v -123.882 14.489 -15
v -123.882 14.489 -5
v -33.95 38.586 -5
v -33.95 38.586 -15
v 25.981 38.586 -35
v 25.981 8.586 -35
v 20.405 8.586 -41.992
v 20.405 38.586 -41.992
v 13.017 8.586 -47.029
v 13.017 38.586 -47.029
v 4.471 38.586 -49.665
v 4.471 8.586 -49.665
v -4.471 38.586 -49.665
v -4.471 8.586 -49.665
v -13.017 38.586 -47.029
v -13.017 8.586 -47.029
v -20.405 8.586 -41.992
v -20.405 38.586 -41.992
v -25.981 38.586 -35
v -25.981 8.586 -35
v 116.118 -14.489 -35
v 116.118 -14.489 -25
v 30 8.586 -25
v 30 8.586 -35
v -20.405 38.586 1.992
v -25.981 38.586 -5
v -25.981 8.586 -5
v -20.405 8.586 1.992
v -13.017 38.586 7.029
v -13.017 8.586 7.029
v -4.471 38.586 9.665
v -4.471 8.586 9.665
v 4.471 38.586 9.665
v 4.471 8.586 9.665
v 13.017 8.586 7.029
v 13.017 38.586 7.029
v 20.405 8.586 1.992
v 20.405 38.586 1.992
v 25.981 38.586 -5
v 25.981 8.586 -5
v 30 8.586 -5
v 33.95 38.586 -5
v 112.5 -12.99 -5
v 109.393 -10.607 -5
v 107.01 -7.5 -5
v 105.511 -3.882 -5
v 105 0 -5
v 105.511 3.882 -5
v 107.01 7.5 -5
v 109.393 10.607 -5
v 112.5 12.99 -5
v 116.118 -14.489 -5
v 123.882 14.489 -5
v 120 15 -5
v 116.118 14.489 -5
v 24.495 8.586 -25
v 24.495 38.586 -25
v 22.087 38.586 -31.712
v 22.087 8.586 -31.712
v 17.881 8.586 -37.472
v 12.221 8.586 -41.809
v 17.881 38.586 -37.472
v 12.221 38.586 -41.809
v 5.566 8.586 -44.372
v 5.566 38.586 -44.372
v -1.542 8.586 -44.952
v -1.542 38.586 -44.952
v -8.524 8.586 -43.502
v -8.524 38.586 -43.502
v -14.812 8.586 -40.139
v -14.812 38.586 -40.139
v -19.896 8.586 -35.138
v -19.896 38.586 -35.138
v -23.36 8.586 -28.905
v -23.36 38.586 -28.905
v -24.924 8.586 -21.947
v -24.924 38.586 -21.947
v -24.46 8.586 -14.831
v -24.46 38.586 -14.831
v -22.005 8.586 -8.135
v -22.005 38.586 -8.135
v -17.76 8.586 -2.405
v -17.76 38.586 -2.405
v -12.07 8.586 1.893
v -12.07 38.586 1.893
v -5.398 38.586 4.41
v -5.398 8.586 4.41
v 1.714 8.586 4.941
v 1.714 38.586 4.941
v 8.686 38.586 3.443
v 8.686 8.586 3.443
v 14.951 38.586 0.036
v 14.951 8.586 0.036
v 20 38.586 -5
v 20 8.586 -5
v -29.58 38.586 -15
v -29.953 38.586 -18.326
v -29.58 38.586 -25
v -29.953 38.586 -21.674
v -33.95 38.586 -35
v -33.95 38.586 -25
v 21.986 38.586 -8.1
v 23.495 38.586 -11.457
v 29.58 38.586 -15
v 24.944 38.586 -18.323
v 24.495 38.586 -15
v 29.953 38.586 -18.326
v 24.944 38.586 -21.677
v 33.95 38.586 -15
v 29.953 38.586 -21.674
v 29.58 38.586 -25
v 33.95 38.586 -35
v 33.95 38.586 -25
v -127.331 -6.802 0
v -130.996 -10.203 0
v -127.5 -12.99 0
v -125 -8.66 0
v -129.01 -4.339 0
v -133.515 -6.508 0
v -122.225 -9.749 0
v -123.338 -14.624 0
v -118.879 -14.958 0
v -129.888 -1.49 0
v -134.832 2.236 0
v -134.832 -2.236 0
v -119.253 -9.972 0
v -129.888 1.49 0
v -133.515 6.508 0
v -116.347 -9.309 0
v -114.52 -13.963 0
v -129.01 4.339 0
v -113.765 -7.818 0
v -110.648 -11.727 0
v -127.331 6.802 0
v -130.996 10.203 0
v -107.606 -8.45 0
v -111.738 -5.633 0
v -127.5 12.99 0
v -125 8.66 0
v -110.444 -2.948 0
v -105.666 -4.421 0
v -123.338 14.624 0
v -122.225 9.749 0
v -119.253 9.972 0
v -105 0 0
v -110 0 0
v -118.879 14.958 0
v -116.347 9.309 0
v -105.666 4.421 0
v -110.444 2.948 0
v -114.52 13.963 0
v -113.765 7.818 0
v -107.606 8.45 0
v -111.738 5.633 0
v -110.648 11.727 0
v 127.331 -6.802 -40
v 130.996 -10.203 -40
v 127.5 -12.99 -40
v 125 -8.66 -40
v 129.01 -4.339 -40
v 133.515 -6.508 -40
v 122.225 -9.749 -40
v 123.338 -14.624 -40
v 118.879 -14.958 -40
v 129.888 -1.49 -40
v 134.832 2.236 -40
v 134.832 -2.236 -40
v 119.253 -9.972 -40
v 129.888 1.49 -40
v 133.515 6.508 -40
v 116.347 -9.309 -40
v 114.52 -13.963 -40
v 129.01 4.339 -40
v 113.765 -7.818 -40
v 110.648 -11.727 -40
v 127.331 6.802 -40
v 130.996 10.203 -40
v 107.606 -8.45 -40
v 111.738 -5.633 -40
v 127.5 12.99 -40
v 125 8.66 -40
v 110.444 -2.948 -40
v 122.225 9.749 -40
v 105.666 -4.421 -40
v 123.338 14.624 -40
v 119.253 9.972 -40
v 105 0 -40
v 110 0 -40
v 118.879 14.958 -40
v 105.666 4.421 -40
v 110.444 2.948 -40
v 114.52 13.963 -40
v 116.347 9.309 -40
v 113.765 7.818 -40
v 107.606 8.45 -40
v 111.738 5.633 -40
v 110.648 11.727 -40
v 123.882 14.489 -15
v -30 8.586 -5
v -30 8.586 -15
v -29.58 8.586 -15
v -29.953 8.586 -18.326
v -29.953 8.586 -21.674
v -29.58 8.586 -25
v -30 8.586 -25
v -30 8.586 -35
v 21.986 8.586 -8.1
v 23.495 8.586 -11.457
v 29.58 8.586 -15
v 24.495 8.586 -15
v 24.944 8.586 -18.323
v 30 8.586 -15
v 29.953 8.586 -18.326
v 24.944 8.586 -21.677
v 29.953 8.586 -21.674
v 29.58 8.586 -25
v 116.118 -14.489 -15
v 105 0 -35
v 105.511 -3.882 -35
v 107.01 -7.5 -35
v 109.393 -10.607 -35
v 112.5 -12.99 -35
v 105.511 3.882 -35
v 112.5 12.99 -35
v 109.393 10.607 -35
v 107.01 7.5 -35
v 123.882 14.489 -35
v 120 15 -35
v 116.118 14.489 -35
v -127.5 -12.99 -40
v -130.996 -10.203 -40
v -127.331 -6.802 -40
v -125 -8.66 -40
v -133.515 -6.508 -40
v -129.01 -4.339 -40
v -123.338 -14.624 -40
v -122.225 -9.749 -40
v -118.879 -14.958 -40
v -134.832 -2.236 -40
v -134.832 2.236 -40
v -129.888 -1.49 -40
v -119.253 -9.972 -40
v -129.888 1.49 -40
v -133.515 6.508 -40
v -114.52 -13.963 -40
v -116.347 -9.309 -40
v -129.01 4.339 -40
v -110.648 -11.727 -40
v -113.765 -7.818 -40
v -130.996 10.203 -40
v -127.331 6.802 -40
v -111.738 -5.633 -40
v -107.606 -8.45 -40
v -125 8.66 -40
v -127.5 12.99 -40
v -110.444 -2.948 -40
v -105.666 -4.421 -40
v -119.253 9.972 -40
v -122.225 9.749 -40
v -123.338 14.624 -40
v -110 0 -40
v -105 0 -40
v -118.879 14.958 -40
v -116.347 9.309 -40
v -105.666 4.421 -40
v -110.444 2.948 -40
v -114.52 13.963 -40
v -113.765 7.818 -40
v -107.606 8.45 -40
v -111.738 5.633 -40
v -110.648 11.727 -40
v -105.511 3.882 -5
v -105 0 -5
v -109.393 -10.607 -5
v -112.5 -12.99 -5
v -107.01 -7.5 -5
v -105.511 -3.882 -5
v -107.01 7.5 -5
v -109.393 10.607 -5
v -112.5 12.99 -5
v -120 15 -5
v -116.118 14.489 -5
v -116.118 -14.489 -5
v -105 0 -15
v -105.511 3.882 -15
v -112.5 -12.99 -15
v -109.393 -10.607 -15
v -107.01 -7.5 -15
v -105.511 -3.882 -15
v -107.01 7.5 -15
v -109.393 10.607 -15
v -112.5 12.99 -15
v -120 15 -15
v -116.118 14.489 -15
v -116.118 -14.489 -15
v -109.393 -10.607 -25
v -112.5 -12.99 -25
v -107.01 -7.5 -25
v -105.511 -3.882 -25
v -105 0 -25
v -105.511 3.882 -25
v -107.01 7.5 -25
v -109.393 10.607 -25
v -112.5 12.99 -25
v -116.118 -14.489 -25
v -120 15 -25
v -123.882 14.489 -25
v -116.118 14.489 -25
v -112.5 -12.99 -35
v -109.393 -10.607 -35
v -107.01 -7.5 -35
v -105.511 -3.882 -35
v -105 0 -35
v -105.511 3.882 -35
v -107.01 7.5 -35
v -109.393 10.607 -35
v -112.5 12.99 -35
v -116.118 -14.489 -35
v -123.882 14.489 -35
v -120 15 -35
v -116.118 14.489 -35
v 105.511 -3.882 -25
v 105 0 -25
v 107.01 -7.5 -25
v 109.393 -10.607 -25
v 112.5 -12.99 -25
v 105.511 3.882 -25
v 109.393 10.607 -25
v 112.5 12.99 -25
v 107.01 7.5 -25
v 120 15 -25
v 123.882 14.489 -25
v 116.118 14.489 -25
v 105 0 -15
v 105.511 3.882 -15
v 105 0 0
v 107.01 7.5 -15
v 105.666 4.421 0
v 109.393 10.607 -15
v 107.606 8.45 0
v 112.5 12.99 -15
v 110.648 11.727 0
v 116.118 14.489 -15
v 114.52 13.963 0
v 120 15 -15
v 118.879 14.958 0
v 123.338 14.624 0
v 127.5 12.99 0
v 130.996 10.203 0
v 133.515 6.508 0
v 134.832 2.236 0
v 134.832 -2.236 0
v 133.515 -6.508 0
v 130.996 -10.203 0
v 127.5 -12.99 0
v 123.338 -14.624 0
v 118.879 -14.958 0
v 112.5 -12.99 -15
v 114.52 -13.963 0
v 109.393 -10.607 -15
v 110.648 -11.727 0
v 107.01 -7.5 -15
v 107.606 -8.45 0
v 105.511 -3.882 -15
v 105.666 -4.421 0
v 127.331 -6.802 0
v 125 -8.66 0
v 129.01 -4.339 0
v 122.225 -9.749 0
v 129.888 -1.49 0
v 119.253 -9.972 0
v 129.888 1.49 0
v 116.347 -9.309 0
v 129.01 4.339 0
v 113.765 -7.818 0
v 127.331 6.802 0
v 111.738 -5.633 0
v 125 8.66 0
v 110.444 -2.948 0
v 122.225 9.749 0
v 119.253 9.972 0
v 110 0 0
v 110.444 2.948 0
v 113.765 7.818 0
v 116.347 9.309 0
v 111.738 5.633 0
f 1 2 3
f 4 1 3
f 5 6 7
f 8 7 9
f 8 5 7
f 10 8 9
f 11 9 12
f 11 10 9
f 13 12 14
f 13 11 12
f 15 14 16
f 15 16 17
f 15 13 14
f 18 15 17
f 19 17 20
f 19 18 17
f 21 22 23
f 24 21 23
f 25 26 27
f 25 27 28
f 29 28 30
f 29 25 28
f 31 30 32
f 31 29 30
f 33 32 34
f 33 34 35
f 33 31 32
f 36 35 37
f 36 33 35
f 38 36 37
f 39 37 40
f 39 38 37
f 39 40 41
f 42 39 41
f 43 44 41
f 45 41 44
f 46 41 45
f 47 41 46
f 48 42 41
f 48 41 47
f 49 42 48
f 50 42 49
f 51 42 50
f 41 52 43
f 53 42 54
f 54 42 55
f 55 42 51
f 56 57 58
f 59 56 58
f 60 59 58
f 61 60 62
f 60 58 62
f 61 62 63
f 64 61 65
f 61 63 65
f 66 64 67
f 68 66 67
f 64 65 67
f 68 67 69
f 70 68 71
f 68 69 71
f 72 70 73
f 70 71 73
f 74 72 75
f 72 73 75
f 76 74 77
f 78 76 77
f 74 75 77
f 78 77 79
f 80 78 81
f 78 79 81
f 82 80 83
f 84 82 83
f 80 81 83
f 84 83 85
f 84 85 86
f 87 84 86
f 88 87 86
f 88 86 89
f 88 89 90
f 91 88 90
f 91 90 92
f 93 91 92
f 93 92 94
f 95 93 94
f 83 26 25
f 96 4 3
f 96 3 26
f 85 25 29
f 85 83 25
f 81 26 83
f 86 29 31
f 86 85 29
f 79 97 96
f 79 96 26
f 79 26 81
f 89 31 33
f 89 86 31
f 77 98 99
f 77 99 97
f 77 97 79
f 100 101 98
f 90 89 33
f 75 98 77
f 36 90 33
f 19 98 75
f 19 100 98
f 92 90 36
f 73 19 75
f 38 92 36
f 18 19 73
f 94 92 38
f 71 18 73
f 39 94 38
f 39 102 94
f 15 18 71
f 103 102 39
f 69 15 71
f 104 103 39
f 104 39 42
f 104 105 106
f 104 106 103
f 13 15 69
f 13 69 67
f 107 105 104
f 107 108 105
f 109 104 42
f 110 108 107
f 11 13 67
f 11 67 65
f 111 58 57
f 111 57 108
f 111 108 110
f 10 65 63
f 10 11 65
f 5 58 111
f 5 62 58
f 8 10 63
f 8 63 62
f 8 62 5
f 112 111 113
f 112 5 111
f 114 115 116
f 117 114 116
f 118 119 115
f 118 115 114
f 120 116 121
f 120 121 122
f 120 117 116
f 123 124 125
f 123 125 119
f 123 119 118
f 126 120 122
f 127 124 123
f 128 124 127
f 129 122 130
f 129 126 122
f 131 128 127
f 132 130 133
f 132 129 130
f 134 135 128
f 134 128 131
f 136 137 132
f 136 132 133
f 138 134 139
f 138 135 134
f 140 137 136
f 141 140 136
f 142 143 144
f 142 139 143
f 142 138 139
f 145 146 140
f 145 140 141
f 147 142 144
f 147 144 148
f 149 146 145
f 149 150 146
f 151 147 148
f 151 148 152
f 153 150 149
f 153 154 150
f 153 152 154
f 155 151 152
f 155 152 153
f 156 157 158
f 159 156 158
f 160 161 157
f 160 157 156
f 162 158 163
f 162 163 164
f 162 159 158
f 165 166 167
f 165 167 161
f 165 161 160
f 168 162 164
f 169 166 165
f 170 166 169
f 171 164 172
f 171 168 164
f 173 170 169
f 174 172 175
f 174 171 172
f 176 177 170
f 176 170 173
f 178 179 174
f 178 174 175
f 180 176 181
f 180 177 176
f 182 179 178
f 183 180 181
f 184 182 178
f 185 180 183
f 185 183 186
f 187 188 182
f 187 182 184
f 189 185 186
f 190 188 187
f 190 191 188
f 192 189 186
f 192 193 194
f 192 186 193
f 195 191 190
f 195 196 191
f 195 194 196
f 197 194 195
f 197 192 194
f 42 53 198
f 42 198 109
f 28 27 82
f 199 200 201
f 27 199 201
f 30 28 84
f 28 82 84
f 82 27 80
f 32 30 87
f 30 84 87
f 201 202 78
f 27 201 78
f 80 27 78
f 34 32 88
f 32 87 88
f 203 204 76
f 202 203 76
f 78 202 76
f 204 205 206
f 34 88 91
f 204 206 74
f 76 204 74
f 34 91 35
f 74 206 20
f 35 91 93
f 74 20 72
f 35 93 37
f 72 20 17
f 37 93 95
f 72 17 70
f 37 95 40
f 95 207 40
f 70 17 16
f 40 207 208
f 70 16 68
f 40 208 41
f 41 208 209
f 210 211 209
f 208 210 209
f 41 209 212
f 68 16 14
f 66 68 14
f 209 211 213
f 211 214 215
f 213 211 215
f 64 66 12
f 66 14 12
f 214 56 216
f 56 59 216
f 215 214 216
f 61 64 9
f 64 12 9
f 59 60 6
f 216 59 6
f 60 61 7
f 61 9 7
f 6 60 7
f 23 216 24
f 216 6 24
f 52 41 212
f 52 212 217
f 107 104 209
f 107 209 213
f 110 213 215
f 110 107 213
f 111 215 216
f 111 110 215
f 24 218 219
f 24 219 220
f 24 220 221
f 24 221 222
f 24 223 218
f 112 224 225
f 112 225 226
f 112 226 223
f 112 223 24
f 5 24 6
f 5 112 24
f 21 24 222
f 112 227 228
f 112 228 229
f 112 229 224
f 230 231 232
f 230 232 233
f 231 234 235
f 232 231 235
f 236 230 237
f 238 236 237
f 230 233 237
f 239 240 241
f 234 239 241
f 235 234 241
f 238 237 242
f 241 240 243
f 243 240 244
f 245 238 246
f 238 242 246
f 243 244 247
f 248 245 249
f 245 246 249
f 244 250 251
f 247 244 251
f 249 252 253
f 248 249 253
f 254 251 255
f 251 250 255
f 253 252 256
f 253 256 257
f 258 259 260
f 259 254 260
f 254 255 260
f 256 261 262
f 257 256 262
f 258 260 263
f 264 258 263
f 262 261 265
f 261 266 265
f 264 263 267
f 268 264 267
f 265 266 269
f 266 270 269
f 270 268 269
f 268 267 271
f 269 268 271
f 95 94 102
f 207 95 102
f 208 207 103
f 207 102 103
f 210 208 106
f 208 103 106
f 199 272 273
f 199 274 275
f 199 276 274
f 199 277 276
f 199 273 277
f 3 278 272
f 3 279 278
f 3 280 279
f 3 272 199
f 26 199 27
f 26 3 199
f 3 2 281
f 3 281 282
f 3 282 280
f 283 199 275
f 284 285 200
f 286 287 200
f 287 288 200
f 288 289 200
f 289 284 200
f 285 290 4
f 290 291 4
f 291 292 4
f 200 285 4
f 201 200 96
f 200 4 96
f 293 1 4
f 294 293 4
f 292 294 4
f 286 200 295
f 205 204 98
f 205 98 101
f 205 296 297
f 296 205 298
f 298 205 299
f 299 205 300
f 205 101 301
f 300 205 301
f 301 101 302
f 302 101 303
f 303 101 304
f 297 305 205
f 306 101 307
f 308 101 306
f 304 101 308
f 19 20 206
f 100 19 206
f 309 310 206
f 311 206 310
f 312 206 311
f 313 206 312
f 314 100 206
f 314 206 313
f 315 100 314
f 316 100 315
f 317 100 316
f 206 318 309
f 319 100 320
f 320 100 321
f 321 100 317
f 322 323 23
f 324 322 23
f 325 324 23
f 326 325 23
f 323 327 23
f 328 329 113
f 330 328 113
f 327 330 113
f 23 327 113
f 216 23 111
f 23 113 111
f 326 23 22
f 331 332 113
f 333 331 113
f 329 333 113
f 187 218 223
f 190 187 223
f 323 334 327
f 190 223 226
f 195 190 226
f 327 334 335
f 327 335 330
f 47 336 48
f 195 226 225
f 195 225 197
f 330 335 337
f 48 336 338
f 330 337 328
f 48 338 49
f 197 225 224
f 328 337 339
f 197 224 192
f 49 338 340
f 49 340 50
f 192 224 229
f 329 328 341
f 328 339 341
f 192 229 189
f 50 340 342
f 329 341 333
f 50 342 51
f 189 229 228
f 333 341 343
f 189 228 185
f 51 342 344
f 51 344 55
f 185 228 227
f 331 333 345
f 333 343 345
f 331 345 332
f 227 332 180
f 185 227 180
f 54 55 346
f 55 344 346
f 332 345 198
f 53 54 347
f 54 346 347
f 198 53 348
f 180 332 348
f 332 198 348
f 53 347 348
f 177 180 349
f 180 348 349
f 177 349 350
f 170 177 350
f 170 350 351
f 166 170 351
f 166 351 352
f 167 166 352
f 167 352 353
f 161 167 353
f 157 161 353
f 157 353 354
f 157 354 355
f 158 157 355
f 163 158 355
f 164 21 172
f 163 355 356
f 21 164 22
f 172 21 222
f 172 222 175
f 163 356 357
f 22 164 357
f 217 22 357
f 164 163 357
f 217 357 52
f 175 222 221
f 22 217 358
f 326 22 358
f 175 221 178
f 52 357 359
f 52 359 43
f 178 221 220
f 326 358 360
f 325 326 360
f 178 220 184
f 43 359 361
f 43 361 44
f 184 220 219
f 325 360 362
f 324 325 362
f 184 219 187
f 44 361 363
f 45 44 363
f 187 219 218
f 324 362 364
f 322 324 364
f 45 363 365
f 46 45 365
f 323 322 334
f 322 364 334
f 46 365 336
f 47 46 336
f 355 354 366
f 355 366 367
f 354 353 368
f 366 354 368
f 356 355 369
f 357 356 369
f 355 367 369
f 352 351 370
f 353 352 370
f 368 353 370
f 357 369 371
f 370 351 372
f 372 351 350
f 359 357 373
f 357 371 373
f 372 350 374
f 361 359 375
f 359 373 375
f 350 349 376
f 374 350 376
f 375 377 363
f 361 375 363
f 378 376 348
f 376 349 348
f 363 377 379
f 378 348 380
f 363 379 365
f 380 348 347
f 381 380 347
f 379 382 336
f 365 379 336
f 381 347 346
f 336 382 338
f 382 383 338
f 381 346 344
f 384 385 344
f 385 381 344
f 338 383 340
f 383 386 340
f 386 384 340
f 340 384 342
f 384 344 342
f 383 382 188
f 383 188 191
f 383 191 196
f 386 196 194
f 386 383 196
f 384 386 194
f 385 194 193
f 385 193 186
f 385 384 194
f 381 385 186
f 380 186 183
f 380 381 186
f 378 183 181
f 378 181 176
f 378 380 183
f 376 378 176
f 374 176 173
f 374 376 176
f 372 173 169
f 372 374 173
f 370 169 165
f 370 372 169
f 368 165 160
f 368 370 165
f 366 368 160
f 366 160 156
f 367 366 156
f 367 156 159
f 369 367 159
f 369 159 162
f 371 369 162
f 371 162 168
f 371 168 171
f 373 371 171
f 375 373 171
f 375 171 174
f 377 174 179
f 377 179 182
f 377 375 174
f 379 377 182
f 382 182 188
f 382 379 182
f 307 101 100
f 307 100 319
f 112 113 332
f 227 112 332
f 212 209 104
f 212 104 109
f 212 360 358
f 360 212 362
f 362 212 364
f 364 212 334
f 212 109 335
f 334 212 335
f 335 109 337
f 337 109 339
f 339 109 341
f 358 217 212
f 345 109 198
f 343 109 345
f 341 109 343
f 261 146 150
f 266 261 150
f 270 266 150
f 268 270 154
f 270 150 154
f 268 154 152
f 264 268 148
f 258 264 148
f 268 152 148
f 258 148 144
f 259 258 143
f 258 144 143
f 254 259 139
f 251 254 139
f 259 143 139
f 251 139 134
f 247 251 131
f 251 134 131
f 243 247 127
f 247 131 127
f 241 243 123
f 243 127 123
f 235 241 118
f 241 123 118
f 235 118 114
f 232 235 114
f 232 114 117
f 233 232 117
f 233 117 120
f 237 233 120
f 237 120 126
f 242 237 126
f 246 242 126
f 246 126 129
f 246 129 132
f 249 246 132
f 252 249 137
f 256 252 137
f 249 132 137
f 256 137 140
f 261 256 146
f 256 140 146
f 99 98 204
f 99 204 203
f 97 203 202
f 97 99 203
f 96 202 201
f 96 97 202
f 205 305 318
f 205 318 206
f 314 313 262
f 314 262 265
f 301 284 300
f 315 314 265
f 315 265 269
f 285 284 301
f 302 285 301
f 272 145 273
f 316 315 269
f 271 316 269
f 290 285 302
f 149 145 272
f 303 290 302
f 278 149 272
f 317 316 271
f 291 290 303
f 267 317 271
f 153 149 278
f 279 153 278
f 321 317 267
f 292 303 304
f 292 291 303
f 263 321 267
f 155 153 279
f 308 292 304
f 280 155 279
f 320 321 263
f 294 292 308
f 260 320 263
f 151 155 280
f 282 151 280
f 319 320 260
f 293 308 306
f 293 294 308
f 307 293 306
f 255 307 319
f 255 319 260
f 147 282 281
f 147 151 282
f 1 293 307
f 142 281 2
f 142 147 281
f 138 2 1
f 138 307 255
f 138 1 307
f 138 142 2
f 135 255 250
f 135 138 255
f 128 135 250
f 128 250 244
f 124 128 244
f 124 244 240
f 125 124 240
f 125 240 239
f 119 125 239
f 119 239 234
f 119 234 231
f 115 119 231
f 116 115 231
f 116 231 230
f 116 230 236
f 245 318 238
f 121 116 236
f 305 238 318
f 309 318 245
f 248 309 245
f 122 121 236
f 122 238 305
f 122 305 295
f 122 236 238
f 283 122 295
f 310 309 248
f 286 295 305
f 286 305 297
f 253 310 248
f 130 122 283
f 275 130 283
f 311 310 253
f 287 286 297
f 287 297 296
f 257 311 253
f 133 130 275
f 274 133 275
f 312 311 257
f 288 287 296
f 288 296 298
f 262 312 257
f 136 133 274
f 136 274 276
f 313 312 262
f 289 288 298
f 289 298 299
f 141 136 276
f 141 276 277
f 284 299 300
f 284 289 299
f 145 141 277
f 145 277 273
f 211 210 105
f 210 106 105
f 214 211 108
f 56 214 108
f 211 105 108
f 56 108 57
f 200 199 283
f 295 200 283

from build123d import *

# Parameters (mm, degrees)
SKETCH1_R           = 10
BOSS_EXTRUDE1_DEPTH = 40
BOSS_EXTRUDE2_START = -5
BOSS_EXTRUDE2_DEPTH = 10
BOSS_EXTRUDE3_START = -25
BOSS_EXTRUDE3_DEPTH = 10
SKETCH4_R           = 30
SKETCH4_R_2         = 25
BOSS_EXTRUDE4_DEPTH = 30
CUT_EXTRUDE3_START  = 50
SKETCH5_R           = 25
CUT_EXTRUDE3_DEPTH  = 50


with BuildPart() as part:
    # Sketch1 → Boss-Extrude1 (new body)
    with BuildSketch(Plane.XY):
        with BuildLine():
            ThreePointArc((-123.882285677, 14.488887394), (-134.488887394, -3.882285677), (-116.117714323, -14.488887394))
            ThreePointArc((-116.117714323, -14.488887394), (-108.099699896, -9.131421435), (-105, 0))
            ThreePointArc((-105, 0), (-110.868578565, 11.900300104), (-123.882285677, 14.488887394))
        make_face()
        with Locations((-120, 0)):
            Circle(SKETCH1_R, mode=Mode.SUBTRACT)
    extrude(amount=-BOSS_EXTRUDE1_DEPTH)

    # Sketch2 → Boss-Extrude2 (add)
    with BuildSketch(Plane.XY.offset(BOSS_EXTRUDE2_START)):
        with BuildLine():
            Line((0, 38.586284613), (0, 8.586284613))
            Line((0, 8.586284613), (-30, 8.586284613))
            Line((-30, 8.586284613), (-116.117714323, -14.488887394))
            ThreePointArc((-116.117714323, -14.488887394), (-105.511112606, 3.882285677), (-123.882285677, 14.488887394))
            Line((-123.882285677, 14.488887394), (-33.949574928, 38.586284613))
            Line((-33.949574928, 38.586284613), (0, 38.586284613))
        make_face()
    extrude(amount=-BOSS_EXTRUDE2_DEPTH)

    # Sketch3 → Boss-Extrude3 (add)
    with BuildSketch(Plane.XY.offset(BOSS_EXTRUDE3_START)):
        with BuildLine():
            Line((-116.117714323, -14.488887394), (-30, 8.586284613))
            Line((-30, 8.586284613), (0, 8.586284613))
            Line((0, 8.586284613), (0, 38.586284613))
            Line((0, 38.586284613), (-33.949574928, 38.586284613))
            Line((-33.949574928, 38.586284613), (-123.882285677, 14.488887394))
            ThreePointArc((-123.882285677, 14.488887394), (-105.511112606, 3.882285677), (-116.117714323, -14.488887394))
        make_face()
    extrude(amount=-BOSS_EXTRUDE3_DEPTH)

    # Mirror1: part across plane


with BuildPart() as part_1:
    add(part.part)
    add(part.part.mirror(Plane(origin=(0, 0, 0), x_dir=(0, 0, 1), z_dir=(1, 0, 0))))

    # Sketch4 → Boss-Extrude4 (add)
    with BuildSketch(Plane(origin=(0, 38.586284613, 0), x_dir=(1, 0, 0), z_dir=(0, 1, 0))):
        with Locations((0, 20)):
            Circle(SKETCH4_R)
        with Locations((0, 20)):
            Circle(SKETCH4_R_2, mode=Mode.SUBTRACT)
    extrude(amount=-BOSS_EXTRUDE4_DEPTH)

    # Sketch5 → Cut-Extrude3 (cut)
    with BuildSketch(Plane(origin=(0, 0, 0), x_dir=(1, 0, 0), z_dir=(0, 1, 0)).offset(CUT_EXTRUDE3_START)):
        with Locations((0, 20)):
            Circle(SKETCH5_R)
    extrude(amount=-CUT_EXTRUDE3_DEPTH, mode=Mode.SUBTRACT)


solid = part_1.part
